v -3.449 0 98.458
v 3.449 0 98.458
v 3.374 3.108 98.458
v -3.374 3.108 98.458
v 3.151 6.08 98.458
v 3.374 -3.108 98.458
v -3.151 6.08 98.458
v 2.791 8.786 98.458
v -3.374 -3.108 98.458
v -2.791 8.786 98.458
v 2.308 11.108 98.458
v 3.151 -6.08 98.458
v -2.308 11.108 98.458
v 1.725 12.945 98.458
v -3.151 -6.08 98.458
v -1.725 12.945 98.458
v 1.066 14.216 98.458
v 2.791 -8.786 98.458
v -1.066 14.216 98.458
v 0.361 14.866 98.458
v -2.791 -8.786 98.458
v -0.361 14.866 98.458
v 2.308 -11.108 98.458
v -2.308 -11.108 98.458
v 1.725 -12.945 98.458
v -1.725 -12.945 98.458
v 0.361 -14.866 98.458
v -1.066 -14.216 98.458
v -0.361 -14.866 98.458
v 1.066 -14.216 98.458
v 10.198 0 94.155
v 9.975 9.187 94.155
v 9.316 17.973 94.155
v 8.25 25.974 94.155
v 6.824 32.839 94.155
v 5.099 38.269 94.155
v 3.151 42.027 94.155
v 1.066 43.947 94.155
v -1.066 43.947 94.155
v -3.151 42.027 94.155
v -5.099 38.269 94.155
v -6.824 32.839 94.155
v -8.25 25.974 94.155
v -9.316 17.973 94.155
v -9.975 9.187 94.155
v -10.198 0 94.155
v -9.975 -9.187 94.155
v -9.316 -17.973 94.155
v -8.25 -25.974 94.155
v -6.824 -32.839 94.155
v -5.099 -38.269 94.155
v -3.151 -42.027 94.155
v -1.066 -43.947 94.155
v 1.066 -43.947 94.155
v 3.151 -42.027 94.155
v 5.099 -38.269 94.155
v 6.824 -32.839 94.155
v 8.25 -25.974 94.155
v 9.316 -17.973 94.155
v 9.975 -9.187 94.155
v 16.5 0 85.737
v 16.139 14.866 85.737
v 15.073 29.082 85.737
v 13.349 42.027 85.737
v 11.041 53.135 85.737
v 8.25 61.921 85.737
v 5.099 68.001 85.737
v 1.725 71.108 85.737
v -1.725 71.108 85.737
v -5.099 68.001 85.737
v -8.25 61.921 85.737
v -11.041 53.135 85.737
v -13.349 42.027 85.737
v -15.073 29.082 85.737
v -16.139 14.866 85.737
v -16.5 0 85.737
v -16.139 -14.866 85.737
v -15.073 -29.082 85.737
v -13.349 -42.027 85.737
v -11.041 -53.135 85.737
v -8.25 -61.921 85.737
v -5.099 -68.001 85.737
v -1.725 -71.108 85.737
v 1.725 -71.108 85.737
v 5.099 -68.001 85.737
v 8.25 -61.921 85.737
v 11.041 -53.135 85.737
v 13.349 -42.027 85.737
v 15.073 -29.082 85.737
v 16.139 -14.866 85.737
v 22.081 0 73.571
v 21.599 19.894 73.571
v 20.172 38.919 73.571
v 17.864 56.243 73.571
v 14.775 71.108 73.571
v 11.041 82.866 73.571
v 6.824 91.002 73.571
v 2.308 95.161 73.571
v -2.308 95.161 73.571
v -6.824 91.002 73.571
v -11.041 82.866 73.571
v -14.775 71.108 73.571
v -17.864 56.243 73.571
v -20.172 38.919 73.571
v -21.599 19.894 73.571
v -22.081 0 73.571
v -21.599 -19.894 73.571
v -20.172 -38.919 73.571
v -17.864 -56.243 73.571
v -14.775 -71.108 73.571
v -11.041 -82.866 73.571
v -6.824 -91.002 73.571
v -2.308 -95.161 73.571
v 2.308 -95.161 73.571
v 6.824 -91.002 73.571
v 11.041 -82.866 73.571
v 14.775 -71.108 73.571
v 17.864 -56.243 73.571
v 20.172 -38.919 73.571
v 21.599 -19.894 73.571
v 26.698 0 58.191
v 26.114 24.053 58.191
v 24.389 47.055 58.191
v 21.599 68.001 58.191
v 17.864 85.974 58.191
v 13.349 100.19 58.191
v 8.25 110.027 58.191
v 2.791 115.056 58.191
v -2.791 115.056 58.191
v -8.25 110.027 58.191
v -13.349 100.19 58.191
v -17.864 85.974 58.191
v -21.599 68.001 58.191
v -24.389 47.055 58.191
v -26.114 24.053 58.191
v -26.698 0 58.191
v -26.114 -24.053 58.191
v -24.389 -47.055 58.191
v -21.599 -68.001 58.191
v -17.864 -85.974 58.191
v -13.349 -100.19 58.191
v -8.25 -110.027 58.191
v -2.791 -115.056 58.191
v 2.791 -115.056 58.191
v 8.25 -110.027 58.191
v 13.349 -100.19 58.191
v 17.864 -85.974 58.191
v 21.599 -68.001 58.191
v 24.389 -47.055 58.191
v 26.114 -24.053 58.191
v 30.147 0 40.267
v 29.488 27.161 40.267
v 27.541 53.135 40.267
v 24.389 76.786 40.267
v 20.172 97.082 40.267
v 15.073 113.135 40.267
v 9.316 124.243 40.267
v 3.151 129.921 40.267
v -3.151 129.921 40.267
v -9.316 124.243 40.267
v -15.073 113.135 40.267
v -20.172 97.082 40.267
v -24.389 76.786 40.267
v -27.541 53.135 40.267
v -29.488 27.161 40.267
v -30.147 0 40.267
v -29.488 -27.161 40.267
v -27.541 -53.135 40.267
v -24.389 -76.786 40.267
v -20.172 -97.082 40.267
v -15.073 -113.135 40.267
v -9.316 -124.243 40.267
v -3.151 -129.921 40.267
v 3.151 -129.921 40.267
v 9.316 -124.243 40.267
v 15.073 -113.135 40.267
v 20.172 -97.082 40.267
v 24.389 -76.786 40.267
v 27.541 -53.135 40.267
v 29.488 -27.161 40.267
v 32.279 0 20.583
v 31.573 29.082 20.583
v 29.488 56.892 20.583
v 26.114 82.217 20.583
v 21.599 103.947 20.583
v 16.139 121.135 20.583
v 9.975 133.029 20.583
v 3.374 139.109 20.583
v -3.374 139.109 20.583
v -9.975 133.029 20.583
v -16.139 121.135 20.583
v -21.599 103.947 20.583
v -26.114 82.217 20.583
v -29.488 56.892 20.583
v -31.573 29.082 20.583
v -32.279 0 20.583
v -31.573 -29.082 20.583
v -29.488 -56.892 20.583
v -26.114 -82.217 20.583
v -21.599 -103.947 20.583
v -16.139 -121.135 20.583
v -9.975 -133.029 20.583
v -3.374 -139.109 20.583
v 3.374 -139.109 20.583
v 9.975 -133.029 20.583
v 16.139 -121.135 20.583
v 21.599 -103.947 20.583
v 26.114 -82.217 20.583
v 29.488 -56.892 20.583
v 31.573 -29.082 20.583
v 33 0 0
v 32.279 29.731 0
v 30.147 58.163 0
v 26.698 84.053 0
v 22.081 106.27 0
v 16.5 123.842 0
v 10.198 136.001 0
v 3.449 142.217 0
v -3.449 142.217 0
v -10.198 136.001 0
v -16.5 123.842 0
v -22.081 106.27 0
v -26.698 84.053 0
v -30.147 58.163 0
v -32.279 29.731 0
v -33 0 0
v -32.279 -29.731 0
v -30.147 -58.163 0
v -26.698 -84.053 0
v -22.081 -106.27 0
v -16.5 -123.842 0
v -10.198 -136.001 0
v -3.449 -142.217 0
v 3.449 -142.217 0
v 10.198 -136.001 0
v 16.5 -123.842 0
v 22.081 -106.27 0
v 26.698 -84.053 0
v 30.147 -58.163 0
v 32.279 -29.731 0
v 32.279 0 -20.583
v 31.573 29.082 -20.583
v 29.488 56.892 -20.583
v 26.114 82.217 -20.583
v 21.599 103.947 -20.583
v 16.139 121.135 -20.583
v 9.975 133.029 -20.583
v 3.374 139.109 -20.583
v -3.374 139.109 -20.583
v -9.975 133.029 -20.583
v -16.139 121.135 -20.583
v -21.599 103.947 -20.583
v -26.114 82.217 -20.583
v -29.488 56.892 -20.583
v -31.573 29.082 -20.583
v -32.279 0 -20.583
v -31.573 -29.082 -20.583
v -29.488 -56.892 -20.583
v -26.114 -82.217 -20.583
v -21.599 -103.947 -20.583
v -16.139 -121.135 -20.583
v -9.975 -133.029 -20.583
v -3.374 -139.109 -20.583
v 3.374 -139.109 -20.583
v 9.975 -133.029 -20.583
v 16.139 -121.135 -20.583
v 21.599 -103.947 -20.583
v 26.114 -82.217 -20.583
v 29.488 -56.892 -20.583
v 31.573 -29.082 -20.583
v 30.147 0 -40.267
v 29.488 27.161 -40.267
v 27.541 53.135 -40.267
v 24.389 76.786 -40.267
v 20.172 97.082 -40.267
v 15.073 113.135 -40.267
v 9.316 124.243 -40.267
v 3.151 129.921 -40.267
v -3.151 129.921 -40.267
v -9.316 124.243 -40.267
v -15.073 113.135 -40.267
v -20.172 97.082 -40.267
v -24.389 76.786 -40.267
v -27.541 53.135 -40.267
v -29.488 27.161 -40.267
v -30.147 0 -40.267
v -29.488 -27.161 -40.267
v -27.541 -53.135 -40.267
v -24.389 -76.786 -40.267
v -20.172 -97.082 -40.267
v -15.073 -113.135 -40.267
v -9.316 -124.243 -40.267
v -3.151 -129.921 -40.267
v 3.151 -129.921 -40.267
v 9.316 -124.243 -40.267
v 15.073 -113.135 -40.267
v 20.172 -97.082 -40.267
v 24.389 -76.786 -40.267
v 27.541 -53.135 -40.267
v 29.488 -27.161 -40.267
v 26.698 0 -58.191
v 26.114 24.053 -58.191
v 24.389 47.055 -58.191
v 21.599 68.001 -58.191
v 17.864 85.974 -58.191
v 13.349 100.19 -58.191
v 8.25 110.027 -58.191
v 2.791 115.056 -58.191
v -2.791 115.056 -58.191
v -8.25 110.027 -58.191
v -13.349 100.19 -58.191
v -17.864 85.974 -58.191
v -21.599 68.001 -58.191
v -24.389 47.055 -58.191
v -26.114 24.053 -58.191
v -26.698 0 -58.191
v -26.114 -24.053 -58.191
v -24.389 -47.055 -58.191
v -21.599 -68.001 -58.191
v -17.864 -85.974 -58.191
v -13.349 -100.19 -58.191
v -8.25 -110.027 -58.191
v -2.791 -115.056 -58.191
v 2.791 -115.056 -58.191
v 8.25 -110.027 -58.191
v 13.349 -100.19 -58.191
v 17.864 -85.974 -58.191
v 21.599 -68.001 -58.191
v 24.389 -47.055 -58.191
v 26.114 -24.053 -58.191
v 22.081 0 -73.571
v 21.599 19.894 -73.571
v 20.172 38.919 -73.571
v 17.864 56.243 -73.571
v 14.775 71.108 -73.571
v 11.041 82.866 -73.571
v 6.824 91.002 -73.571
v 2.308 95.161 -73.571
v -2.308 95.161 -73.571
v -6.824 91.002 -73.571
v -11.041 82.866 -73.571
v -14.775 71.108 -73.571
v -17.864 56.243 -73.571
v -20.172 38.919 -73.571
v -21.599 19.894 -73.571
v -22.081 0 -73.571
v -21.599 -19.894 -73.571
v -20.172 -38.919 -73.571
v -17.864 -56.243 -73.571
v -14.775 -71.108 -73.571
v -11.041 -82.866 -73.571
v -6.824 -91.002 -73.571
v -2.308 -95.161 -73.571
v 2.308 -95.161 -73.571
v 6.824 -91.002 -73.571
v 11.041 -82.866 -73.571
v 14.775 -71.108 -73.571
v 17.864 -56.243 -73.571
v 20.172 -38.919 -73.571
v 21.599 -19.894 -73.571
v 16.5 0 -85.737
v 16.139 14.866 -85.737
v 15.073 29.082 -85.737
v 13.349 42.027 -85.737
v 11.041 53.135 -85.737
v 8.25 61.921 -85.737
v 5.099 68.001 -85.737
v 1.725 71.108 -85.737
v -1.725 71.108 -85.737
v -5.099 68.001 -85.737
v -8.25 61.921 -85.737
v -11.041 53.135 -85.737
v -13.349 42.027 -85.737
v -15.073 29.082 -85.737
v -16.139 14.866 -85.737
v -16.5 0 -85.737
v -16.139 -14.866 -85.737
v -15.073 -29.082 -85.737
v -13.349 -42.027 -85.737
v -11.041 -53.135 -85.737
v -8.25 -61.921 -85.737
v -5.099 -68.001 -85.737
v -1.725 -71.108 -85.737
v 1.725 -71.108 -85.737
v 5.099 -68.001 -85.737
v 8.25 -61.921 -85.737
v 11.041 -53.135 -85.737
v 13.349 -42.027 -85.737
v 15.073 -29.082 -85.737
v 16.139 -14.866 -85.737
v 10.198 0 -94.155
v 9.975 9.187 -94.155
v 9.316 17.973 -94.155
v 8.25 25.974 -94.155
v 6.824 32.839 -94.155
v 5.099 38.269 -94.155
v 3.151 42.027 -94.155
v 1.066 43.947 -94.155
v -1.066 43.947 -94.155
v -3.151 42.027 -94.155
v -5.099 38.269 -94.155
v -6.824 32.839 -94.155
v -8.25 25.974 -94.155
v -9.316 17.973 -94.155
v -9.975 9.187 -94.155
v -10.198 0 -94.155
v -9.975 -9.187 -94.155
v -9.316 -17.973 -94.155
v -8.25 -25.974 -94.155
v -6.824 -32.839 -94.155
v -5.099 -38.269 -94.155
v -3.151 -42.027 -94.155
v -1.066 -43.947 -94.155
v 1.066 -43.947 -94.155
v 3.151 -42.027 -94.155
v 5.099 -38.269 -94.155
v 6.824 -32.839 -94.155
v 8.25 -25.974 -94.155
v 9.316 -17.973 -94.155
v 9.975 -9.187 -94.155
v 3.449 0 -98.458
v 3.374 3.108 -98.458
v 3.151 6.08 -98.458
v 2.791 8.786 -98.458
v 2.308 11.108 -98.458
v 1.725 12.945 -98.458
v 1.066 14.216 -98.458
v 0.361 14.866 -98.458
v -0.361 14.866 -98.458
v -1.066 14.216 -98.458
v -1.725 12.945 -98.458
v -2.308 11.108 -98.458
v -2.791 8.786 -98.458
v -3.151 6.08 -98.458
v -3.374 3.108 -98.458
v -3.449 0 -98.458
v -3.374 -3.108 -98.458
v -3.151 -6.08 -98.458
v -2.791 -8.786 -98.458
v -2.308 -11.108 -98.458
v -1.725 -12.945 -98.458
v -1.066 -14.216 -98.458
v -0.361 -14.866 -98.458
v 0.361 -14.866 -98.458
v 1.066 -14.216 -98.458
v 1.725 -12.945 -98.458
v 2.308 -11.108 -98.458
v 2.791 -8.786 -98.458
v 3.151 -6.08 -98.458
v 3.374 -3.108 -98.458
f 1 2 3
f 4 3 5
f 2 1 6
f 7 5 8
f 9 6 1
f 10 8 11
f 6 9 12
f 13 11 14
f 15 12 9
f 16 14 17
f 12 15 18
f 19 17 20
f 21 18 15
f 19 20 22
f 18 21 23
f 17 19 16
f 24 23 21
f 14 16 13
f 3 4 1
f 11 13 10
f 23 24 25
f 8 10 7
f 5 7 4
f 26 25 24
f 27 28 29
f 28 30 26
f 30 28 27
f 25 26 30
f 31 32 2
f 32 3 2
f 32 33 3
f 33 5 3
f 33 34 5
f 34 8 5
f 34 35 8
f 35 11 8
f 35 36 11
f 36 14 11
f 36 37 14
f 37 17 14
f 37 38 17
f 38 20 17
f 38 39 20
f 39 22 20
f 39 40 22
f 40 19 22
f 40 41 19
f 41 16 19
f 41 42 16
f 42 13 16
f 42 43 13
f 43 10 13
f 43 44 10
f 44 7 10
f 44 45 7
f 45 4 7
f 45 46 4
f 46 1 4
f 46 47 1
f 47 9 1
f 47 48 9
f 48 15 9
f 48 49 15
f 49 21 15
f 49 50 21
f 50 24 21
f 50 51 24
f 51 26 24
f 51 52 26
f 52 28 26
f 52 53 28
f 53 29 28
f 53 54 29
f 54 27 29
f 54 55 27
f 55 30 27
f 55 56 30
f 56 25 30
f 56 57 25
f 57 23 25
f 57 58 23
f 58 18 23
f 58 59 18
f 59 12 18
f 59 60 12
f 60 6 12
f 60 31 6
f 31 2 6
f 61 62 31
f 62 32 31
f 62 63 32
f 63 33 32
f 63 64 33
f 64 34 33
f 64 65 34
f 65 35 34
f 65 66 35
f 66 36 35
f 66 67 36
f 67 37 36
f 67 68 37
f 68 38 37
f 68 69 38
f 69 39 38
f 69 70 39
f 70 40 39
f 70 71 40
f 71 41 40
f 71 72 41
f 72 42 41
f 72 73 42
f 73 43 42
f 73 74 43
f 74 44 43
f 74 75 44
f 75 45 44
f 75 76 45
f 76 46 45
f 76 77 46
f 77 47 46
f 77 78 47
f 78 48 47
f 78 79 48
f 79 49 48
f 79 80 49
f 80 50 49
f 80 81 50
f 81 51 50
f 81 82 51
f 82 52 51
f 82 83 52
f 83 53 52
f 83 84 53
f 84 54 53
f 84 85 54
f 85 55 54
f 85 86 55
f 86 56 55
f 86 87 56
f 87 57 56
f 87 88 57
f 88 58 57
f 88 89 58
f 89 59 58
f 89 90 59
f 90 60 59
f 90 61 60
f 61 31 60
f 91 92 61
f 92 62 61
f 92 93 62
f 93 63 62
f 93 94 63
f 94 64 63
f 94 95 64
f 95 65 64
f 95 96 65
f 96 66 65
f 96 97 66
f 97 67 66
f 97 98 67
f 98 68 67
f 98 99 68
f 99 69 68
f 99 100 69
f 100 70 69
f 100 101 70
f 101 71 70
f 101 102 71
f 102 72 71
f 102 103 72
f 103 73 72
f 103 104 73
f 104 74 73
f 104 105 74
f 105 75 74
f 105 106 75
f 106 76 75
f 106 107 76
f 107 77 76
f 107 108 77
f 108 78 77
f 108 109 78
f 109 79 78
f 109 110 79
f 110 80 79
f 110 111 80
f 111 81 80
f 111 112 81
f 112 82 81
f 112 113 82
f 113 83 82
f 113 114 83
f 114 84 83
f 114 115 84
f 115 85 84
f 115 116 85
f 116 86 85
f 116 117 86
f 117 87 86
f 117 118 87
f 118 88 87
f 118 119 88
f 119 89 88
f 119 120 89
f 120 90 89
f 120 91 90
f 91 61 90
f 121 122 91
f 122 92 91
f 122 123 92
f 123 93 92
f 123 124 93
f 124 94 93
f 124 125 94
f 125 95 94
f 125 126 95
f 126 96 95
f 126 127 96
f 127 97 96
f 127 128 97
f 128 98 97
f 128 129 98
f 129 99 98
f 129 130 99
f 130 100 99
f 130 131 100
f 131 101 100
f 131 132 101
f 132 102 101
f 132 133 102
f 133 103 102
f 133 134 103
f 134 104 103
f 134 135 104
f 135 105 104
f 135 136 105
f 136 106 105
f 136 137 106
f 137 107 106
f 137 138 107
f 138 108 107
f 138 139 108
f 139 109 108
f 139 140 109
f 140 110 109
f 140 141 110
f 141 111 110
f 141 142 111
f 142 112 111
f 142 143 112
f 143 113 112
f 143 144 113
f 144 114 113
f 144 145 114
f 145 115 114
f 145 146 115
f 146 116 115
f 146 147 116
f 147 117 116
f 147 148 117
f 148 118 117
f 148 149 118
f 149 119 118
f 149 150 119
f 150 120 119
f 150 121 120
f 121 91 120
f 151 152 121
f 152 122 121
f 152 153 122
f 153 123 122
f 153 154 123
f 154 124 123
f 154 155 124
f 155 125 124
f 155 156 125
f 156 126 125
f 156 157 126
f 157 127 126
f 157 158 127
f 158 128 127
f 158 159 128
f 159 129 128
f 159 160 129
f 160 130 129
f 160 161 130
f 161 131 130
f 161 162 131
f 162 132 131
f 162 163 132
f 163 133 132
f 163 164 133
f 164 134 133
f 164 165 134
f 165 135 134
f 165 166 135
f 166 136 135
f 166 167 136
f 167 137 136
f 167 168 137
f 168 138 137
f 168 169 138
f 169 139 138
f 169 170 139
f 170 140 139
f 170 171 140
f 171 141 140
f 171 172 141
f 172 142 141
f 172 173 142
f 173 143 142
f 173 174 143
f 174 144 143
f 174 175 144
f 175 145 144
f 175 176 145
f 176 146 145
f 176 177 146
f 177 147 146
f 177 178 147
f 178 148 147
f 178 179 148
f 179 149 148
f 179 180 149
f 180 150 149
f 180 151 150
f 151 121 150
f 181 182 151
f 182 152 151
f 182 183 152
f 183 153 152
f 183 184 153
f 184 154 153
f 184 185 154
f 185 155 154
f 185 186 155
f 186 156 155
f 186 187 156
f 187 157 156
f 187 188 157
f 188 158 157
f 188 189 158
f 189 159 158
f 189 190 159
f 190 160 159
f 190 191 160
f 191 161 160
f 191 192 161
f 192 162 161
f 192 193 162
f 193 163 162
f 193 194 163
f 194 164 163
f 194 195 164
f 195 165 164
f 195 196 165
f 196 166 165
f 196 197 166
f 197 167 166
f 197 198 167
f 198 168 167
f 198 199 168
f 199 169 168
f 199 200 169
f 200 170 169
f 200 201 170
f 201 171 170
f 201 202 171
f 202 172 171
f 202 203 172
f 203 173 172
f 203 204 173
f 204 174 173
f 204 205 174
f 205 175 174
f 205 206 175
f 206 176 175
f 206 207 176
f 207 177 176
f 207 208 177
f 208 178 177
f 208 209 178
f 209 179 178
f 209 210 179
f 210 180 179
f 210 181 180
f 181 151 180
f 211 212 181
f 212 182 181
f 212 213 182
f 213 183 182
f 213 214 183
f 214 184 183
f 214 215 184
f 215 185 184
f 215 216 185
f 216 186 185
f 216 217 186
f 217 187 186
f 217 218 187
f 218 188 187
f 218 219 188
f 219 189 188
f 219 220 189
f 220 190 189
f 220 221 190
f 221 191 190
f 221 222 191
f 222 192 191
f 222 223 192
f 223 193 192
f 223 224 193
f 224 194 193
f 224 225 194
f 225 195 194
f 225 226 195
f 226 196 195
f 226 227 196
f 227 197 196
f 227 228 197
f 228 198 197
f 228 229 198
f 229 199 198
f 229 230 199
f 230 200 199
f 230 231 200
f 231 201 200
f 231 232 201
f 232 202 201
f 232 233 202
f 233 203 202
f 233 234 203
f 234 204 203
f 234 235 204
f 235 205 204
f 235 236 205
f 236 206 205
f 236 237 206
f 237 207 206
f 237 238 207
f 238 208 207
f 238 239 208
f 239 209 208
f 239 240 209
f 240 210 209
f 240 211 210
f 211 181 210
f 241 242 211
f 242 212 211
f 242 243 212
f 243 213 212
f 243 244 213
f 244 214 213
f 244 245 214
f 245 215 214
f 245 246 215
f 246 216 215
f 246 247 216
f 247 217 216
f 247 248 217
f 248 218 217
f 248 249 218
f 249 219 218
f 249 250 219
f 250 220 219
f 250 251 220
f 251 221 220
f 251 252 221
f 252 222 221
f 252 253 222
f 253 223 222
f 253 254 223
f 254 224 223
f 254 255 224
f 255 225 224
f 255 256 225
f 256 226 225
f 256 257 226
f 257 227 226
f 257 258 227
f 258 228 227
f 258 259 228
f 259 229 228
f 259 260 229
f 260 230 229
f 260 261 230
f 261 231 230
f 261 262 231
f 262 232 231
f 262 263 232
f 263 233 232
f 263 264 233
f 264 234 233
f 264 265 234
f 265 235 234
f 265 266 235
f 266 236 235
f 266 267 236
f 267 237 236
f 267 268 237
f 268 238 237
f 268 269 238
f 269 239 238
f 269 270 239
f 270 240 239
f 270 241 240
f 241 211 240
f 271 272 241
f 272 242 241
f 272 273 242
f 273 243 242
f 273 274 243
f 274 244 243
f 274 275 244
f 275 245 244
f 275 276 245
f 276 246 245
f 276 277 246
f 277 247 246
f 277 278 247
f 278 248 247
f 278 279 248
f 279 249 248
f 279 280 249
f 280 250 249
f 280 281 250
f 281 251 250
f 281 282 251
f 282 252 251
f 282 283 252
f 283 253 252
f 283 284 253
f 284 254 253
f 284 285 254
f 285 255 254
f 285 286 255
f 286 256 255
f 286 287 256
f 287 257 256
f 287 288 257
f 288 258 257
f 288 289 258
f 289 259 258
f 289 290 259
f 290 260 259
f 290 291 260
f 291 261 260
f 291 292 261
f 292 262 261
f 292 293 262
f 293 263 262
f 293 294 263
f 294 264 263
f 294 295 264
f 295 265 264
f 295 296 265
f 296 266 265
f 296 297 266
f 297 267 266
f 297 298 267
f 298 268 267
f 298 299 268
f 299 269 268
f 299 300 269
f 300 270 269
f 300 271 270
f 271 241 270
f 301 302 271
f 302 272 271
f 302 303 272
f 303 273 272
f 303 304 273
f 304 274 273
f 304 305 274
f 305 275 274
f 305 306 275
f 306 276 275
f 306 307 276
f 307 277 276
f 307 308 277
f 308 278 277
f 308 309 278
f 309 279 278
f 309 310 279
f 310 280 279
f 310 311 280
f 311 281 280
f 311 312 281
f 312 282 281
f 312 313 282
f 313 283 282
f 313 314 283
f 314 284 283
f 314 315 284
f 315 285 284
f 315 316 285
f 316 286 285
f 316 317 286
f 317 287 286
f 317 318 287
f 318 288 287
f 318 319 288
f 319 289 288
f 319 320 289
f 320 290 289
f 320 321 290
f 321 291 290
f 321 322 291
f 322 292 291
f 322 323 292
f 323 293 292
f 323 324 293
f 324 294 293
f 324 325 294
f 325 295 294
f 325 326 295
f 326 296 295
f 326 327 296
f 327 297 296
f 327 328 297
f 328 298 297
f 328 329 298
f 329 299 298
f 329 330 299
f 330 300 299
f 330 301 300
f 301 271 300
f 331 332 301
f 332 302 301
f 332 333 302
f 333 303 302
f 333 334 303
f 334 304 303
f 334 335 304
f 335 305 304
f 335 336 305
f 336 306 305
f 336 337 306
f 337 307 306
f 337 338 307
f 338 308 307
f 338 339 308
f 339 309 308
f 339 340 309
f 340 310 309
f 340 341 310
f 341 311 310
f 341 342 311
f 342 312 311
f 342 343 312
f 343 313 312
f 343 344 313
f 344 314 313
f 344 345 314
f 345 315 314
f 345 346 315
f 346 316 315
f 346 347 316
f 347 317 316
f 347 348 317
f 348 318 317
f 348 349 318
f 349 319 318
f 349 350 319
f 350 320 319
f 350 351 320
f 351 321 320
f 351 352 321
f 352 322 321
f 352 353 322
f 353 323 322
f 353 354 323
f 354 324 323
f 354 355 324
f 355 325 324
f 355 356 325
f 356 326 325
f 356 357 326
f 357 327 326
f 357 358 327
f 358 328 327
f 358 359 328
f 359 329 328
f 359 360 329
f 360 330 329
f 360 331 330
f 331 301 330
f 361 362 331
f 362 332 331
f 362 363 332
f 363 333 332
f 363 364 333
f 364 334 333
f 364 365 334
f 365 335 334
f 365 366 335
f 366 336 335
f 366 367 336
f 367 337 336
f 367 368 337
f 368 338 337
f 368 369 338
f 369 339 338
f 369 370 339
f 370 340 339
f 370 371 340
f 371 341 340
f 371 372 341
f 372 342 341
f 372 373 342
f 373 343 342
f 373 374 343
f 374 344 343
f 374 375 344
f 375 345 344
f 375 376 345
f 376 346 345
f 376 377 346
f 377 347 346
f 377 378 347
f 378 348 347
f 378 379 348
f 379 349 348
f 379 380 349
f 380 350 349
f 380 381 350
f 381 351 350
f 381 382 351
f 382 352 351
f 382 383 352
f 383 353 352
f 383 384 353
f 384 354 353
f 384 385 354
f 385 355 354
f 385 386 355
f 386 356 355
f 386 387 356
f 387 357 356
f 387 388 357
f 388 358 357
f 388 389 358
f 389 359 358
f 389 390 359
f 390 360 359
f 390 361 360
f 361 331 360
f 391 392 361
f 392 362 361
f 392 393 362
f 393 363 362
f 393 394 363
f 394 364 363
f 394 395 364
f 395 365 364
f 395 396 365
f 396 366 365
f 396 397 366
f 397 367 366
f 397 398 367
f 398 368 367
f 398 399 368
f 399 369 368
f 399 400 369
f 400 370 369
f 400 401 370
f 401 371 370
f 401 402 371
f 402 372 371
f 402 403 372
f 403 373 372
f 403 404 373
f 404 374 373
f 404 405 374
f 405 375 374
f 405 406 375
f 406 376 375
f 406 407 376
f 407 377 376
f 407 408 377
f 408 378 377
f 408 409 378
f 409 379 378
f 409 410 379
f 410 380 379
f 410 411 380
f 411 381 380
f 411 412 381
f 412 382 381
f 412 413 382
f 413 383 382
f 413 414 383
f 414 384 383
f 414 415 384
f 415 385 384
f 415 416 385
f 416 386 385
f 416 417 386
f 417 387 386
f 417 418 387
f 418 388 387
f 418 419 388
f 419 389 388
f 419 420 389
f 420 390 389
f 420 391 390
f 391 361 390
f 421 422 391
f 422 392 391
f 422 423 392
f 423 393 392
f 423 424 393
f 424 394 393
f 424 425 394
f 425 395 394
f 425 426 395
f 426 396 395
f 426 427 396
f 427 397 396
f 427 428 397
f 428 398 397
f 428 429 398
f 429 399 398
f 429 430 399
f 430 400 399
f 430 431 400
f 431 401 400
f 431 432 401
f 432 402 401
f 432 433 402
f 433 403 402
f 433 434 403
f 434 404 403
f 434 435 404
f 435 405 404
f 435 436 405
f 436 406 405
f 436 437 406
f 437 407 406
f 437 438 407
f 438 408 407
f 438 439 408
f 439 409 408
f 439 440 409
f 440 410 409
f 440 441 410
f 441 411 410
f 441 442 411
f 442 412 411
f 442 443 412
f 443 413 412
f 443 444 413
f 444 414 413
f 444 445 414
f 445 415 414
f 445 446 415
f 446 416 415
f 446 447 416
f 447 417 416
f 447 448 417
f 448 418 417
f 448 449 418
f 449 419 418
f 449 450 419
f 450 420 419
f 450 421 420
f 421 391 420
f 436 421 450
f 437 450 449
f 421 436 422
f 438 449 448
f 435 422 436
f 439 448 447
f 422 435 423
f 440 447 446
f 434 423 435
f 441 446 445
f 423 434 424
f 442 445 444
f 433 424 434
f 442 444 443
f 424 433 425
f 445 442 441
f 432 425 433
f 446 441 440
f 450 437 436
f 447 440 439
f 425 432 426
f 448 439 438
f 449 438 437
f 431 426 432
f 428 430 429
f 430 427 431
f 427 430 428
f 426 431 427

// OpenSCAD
// Generated by SolidPython 1.0.1 on 2020-07-29 00:46:45


scale(v = [3, 13, 9]) {
	sphere(r = 11);
}
/***********************************************
*********      SolidPython code:      **********
************************************************
 
# import packages: SolidPython
from solid import *
from solid.utils import *
from itertools import chain, combinations, permutations


class Resize:

    def __init__(self, scad_file):
        self.scad_file = scad_file
        #self.scad_file = import_scad(scad_file)
        # cone/cylinder param:
        self.r1 = 0
        self.r2 = 0
        self.h = 0
        # rectangular prism param:
        self.w = 0
        self.l = 0
        # ellipse param:
        self.r = 0

    # import OpenScad code (file name corresponds to shape)


    # classify shape + parameters
    def assign(self, param1, param2, param3):
        if self.scad_file == 'cone.scad':
            self.r1 = param1
            self.r2 = param2
            self.h = param3
        elif self.scad_file == 'cylinder.scad':
            self.r1 = param1
            self.r2 = param2
            self.h = param3
        elif self.scad_file == 'rectangularPrism.scad':
            self.h = param1
            self.l = param2
            self.w = param3
        else:
            self.r = param1
            self.h = param2

    # resize parameters
    def iterate(self):
        x = range(3, 20, 2)
        i = 1
        if self.scad_file == 'cone.scad':
            tempList = list(permutations(x, 2))
            for temp in tempList:
                param1 = temp[0]
                param2 = temp[1]
                filepath = 'produced_scad_files/' + 'cone' + str(param1) + '_' + str(param2) + '_' + '.scad'
                scad_render_to_file(cylinder(h=param1, r1=param2, r2=0), filepath)

        elif self.scad_file == 'cylinder.scad':
            tempList = list(permutations(x, 3))
            for temp in tempList:
                param1 = temp[0]
                param2 = temp[1]
                filepath = 'produced_scad_files/' + 'cylinder' + str(param1) + '_' + str(param2) + '_' + '.scad'
                scad_render_to_file(cylinder(h=param1, r1=param2, r2=param2), filepath)

        elif self.scad_file == 'rectangularPrism.scad':
            tempList = list(permutations(x, 3))
            for temp in tempList:
                param1 = temp[0]
                param2 = temp[1]
                param3 = temp[2]
                filepath = 'produced_scad_files/' + 'rectangularPrism' + str(param1) + '_' + str(param2) + '_' + str(
                    param3) + '.scad'
                scad_render_to_file(cube(size=(param1, param2, param3)), filepath)

        elif self.scad_file == 'ellipse.scad':
            tempList = list(permutations(x, 4))
            for temp in tempList:
                param1 = temp[0]
                param2 = temp[1]
                param3 = temp[2]
                param4 = temp[3]
                filepath = 'produced_scad_files/' + 'ellipse' + str(param1) + '_' + str(param2) + '_' + str(param3) + '_' + str(param4) + '.scad'
                scad_render_to_file(scale([param1, param2, param3])(sphere(r=param4)), filepath)

    def render_to_scadfile(self):
        scad_render_to_file(scad, 'example.scad') 
 
************************************************/
